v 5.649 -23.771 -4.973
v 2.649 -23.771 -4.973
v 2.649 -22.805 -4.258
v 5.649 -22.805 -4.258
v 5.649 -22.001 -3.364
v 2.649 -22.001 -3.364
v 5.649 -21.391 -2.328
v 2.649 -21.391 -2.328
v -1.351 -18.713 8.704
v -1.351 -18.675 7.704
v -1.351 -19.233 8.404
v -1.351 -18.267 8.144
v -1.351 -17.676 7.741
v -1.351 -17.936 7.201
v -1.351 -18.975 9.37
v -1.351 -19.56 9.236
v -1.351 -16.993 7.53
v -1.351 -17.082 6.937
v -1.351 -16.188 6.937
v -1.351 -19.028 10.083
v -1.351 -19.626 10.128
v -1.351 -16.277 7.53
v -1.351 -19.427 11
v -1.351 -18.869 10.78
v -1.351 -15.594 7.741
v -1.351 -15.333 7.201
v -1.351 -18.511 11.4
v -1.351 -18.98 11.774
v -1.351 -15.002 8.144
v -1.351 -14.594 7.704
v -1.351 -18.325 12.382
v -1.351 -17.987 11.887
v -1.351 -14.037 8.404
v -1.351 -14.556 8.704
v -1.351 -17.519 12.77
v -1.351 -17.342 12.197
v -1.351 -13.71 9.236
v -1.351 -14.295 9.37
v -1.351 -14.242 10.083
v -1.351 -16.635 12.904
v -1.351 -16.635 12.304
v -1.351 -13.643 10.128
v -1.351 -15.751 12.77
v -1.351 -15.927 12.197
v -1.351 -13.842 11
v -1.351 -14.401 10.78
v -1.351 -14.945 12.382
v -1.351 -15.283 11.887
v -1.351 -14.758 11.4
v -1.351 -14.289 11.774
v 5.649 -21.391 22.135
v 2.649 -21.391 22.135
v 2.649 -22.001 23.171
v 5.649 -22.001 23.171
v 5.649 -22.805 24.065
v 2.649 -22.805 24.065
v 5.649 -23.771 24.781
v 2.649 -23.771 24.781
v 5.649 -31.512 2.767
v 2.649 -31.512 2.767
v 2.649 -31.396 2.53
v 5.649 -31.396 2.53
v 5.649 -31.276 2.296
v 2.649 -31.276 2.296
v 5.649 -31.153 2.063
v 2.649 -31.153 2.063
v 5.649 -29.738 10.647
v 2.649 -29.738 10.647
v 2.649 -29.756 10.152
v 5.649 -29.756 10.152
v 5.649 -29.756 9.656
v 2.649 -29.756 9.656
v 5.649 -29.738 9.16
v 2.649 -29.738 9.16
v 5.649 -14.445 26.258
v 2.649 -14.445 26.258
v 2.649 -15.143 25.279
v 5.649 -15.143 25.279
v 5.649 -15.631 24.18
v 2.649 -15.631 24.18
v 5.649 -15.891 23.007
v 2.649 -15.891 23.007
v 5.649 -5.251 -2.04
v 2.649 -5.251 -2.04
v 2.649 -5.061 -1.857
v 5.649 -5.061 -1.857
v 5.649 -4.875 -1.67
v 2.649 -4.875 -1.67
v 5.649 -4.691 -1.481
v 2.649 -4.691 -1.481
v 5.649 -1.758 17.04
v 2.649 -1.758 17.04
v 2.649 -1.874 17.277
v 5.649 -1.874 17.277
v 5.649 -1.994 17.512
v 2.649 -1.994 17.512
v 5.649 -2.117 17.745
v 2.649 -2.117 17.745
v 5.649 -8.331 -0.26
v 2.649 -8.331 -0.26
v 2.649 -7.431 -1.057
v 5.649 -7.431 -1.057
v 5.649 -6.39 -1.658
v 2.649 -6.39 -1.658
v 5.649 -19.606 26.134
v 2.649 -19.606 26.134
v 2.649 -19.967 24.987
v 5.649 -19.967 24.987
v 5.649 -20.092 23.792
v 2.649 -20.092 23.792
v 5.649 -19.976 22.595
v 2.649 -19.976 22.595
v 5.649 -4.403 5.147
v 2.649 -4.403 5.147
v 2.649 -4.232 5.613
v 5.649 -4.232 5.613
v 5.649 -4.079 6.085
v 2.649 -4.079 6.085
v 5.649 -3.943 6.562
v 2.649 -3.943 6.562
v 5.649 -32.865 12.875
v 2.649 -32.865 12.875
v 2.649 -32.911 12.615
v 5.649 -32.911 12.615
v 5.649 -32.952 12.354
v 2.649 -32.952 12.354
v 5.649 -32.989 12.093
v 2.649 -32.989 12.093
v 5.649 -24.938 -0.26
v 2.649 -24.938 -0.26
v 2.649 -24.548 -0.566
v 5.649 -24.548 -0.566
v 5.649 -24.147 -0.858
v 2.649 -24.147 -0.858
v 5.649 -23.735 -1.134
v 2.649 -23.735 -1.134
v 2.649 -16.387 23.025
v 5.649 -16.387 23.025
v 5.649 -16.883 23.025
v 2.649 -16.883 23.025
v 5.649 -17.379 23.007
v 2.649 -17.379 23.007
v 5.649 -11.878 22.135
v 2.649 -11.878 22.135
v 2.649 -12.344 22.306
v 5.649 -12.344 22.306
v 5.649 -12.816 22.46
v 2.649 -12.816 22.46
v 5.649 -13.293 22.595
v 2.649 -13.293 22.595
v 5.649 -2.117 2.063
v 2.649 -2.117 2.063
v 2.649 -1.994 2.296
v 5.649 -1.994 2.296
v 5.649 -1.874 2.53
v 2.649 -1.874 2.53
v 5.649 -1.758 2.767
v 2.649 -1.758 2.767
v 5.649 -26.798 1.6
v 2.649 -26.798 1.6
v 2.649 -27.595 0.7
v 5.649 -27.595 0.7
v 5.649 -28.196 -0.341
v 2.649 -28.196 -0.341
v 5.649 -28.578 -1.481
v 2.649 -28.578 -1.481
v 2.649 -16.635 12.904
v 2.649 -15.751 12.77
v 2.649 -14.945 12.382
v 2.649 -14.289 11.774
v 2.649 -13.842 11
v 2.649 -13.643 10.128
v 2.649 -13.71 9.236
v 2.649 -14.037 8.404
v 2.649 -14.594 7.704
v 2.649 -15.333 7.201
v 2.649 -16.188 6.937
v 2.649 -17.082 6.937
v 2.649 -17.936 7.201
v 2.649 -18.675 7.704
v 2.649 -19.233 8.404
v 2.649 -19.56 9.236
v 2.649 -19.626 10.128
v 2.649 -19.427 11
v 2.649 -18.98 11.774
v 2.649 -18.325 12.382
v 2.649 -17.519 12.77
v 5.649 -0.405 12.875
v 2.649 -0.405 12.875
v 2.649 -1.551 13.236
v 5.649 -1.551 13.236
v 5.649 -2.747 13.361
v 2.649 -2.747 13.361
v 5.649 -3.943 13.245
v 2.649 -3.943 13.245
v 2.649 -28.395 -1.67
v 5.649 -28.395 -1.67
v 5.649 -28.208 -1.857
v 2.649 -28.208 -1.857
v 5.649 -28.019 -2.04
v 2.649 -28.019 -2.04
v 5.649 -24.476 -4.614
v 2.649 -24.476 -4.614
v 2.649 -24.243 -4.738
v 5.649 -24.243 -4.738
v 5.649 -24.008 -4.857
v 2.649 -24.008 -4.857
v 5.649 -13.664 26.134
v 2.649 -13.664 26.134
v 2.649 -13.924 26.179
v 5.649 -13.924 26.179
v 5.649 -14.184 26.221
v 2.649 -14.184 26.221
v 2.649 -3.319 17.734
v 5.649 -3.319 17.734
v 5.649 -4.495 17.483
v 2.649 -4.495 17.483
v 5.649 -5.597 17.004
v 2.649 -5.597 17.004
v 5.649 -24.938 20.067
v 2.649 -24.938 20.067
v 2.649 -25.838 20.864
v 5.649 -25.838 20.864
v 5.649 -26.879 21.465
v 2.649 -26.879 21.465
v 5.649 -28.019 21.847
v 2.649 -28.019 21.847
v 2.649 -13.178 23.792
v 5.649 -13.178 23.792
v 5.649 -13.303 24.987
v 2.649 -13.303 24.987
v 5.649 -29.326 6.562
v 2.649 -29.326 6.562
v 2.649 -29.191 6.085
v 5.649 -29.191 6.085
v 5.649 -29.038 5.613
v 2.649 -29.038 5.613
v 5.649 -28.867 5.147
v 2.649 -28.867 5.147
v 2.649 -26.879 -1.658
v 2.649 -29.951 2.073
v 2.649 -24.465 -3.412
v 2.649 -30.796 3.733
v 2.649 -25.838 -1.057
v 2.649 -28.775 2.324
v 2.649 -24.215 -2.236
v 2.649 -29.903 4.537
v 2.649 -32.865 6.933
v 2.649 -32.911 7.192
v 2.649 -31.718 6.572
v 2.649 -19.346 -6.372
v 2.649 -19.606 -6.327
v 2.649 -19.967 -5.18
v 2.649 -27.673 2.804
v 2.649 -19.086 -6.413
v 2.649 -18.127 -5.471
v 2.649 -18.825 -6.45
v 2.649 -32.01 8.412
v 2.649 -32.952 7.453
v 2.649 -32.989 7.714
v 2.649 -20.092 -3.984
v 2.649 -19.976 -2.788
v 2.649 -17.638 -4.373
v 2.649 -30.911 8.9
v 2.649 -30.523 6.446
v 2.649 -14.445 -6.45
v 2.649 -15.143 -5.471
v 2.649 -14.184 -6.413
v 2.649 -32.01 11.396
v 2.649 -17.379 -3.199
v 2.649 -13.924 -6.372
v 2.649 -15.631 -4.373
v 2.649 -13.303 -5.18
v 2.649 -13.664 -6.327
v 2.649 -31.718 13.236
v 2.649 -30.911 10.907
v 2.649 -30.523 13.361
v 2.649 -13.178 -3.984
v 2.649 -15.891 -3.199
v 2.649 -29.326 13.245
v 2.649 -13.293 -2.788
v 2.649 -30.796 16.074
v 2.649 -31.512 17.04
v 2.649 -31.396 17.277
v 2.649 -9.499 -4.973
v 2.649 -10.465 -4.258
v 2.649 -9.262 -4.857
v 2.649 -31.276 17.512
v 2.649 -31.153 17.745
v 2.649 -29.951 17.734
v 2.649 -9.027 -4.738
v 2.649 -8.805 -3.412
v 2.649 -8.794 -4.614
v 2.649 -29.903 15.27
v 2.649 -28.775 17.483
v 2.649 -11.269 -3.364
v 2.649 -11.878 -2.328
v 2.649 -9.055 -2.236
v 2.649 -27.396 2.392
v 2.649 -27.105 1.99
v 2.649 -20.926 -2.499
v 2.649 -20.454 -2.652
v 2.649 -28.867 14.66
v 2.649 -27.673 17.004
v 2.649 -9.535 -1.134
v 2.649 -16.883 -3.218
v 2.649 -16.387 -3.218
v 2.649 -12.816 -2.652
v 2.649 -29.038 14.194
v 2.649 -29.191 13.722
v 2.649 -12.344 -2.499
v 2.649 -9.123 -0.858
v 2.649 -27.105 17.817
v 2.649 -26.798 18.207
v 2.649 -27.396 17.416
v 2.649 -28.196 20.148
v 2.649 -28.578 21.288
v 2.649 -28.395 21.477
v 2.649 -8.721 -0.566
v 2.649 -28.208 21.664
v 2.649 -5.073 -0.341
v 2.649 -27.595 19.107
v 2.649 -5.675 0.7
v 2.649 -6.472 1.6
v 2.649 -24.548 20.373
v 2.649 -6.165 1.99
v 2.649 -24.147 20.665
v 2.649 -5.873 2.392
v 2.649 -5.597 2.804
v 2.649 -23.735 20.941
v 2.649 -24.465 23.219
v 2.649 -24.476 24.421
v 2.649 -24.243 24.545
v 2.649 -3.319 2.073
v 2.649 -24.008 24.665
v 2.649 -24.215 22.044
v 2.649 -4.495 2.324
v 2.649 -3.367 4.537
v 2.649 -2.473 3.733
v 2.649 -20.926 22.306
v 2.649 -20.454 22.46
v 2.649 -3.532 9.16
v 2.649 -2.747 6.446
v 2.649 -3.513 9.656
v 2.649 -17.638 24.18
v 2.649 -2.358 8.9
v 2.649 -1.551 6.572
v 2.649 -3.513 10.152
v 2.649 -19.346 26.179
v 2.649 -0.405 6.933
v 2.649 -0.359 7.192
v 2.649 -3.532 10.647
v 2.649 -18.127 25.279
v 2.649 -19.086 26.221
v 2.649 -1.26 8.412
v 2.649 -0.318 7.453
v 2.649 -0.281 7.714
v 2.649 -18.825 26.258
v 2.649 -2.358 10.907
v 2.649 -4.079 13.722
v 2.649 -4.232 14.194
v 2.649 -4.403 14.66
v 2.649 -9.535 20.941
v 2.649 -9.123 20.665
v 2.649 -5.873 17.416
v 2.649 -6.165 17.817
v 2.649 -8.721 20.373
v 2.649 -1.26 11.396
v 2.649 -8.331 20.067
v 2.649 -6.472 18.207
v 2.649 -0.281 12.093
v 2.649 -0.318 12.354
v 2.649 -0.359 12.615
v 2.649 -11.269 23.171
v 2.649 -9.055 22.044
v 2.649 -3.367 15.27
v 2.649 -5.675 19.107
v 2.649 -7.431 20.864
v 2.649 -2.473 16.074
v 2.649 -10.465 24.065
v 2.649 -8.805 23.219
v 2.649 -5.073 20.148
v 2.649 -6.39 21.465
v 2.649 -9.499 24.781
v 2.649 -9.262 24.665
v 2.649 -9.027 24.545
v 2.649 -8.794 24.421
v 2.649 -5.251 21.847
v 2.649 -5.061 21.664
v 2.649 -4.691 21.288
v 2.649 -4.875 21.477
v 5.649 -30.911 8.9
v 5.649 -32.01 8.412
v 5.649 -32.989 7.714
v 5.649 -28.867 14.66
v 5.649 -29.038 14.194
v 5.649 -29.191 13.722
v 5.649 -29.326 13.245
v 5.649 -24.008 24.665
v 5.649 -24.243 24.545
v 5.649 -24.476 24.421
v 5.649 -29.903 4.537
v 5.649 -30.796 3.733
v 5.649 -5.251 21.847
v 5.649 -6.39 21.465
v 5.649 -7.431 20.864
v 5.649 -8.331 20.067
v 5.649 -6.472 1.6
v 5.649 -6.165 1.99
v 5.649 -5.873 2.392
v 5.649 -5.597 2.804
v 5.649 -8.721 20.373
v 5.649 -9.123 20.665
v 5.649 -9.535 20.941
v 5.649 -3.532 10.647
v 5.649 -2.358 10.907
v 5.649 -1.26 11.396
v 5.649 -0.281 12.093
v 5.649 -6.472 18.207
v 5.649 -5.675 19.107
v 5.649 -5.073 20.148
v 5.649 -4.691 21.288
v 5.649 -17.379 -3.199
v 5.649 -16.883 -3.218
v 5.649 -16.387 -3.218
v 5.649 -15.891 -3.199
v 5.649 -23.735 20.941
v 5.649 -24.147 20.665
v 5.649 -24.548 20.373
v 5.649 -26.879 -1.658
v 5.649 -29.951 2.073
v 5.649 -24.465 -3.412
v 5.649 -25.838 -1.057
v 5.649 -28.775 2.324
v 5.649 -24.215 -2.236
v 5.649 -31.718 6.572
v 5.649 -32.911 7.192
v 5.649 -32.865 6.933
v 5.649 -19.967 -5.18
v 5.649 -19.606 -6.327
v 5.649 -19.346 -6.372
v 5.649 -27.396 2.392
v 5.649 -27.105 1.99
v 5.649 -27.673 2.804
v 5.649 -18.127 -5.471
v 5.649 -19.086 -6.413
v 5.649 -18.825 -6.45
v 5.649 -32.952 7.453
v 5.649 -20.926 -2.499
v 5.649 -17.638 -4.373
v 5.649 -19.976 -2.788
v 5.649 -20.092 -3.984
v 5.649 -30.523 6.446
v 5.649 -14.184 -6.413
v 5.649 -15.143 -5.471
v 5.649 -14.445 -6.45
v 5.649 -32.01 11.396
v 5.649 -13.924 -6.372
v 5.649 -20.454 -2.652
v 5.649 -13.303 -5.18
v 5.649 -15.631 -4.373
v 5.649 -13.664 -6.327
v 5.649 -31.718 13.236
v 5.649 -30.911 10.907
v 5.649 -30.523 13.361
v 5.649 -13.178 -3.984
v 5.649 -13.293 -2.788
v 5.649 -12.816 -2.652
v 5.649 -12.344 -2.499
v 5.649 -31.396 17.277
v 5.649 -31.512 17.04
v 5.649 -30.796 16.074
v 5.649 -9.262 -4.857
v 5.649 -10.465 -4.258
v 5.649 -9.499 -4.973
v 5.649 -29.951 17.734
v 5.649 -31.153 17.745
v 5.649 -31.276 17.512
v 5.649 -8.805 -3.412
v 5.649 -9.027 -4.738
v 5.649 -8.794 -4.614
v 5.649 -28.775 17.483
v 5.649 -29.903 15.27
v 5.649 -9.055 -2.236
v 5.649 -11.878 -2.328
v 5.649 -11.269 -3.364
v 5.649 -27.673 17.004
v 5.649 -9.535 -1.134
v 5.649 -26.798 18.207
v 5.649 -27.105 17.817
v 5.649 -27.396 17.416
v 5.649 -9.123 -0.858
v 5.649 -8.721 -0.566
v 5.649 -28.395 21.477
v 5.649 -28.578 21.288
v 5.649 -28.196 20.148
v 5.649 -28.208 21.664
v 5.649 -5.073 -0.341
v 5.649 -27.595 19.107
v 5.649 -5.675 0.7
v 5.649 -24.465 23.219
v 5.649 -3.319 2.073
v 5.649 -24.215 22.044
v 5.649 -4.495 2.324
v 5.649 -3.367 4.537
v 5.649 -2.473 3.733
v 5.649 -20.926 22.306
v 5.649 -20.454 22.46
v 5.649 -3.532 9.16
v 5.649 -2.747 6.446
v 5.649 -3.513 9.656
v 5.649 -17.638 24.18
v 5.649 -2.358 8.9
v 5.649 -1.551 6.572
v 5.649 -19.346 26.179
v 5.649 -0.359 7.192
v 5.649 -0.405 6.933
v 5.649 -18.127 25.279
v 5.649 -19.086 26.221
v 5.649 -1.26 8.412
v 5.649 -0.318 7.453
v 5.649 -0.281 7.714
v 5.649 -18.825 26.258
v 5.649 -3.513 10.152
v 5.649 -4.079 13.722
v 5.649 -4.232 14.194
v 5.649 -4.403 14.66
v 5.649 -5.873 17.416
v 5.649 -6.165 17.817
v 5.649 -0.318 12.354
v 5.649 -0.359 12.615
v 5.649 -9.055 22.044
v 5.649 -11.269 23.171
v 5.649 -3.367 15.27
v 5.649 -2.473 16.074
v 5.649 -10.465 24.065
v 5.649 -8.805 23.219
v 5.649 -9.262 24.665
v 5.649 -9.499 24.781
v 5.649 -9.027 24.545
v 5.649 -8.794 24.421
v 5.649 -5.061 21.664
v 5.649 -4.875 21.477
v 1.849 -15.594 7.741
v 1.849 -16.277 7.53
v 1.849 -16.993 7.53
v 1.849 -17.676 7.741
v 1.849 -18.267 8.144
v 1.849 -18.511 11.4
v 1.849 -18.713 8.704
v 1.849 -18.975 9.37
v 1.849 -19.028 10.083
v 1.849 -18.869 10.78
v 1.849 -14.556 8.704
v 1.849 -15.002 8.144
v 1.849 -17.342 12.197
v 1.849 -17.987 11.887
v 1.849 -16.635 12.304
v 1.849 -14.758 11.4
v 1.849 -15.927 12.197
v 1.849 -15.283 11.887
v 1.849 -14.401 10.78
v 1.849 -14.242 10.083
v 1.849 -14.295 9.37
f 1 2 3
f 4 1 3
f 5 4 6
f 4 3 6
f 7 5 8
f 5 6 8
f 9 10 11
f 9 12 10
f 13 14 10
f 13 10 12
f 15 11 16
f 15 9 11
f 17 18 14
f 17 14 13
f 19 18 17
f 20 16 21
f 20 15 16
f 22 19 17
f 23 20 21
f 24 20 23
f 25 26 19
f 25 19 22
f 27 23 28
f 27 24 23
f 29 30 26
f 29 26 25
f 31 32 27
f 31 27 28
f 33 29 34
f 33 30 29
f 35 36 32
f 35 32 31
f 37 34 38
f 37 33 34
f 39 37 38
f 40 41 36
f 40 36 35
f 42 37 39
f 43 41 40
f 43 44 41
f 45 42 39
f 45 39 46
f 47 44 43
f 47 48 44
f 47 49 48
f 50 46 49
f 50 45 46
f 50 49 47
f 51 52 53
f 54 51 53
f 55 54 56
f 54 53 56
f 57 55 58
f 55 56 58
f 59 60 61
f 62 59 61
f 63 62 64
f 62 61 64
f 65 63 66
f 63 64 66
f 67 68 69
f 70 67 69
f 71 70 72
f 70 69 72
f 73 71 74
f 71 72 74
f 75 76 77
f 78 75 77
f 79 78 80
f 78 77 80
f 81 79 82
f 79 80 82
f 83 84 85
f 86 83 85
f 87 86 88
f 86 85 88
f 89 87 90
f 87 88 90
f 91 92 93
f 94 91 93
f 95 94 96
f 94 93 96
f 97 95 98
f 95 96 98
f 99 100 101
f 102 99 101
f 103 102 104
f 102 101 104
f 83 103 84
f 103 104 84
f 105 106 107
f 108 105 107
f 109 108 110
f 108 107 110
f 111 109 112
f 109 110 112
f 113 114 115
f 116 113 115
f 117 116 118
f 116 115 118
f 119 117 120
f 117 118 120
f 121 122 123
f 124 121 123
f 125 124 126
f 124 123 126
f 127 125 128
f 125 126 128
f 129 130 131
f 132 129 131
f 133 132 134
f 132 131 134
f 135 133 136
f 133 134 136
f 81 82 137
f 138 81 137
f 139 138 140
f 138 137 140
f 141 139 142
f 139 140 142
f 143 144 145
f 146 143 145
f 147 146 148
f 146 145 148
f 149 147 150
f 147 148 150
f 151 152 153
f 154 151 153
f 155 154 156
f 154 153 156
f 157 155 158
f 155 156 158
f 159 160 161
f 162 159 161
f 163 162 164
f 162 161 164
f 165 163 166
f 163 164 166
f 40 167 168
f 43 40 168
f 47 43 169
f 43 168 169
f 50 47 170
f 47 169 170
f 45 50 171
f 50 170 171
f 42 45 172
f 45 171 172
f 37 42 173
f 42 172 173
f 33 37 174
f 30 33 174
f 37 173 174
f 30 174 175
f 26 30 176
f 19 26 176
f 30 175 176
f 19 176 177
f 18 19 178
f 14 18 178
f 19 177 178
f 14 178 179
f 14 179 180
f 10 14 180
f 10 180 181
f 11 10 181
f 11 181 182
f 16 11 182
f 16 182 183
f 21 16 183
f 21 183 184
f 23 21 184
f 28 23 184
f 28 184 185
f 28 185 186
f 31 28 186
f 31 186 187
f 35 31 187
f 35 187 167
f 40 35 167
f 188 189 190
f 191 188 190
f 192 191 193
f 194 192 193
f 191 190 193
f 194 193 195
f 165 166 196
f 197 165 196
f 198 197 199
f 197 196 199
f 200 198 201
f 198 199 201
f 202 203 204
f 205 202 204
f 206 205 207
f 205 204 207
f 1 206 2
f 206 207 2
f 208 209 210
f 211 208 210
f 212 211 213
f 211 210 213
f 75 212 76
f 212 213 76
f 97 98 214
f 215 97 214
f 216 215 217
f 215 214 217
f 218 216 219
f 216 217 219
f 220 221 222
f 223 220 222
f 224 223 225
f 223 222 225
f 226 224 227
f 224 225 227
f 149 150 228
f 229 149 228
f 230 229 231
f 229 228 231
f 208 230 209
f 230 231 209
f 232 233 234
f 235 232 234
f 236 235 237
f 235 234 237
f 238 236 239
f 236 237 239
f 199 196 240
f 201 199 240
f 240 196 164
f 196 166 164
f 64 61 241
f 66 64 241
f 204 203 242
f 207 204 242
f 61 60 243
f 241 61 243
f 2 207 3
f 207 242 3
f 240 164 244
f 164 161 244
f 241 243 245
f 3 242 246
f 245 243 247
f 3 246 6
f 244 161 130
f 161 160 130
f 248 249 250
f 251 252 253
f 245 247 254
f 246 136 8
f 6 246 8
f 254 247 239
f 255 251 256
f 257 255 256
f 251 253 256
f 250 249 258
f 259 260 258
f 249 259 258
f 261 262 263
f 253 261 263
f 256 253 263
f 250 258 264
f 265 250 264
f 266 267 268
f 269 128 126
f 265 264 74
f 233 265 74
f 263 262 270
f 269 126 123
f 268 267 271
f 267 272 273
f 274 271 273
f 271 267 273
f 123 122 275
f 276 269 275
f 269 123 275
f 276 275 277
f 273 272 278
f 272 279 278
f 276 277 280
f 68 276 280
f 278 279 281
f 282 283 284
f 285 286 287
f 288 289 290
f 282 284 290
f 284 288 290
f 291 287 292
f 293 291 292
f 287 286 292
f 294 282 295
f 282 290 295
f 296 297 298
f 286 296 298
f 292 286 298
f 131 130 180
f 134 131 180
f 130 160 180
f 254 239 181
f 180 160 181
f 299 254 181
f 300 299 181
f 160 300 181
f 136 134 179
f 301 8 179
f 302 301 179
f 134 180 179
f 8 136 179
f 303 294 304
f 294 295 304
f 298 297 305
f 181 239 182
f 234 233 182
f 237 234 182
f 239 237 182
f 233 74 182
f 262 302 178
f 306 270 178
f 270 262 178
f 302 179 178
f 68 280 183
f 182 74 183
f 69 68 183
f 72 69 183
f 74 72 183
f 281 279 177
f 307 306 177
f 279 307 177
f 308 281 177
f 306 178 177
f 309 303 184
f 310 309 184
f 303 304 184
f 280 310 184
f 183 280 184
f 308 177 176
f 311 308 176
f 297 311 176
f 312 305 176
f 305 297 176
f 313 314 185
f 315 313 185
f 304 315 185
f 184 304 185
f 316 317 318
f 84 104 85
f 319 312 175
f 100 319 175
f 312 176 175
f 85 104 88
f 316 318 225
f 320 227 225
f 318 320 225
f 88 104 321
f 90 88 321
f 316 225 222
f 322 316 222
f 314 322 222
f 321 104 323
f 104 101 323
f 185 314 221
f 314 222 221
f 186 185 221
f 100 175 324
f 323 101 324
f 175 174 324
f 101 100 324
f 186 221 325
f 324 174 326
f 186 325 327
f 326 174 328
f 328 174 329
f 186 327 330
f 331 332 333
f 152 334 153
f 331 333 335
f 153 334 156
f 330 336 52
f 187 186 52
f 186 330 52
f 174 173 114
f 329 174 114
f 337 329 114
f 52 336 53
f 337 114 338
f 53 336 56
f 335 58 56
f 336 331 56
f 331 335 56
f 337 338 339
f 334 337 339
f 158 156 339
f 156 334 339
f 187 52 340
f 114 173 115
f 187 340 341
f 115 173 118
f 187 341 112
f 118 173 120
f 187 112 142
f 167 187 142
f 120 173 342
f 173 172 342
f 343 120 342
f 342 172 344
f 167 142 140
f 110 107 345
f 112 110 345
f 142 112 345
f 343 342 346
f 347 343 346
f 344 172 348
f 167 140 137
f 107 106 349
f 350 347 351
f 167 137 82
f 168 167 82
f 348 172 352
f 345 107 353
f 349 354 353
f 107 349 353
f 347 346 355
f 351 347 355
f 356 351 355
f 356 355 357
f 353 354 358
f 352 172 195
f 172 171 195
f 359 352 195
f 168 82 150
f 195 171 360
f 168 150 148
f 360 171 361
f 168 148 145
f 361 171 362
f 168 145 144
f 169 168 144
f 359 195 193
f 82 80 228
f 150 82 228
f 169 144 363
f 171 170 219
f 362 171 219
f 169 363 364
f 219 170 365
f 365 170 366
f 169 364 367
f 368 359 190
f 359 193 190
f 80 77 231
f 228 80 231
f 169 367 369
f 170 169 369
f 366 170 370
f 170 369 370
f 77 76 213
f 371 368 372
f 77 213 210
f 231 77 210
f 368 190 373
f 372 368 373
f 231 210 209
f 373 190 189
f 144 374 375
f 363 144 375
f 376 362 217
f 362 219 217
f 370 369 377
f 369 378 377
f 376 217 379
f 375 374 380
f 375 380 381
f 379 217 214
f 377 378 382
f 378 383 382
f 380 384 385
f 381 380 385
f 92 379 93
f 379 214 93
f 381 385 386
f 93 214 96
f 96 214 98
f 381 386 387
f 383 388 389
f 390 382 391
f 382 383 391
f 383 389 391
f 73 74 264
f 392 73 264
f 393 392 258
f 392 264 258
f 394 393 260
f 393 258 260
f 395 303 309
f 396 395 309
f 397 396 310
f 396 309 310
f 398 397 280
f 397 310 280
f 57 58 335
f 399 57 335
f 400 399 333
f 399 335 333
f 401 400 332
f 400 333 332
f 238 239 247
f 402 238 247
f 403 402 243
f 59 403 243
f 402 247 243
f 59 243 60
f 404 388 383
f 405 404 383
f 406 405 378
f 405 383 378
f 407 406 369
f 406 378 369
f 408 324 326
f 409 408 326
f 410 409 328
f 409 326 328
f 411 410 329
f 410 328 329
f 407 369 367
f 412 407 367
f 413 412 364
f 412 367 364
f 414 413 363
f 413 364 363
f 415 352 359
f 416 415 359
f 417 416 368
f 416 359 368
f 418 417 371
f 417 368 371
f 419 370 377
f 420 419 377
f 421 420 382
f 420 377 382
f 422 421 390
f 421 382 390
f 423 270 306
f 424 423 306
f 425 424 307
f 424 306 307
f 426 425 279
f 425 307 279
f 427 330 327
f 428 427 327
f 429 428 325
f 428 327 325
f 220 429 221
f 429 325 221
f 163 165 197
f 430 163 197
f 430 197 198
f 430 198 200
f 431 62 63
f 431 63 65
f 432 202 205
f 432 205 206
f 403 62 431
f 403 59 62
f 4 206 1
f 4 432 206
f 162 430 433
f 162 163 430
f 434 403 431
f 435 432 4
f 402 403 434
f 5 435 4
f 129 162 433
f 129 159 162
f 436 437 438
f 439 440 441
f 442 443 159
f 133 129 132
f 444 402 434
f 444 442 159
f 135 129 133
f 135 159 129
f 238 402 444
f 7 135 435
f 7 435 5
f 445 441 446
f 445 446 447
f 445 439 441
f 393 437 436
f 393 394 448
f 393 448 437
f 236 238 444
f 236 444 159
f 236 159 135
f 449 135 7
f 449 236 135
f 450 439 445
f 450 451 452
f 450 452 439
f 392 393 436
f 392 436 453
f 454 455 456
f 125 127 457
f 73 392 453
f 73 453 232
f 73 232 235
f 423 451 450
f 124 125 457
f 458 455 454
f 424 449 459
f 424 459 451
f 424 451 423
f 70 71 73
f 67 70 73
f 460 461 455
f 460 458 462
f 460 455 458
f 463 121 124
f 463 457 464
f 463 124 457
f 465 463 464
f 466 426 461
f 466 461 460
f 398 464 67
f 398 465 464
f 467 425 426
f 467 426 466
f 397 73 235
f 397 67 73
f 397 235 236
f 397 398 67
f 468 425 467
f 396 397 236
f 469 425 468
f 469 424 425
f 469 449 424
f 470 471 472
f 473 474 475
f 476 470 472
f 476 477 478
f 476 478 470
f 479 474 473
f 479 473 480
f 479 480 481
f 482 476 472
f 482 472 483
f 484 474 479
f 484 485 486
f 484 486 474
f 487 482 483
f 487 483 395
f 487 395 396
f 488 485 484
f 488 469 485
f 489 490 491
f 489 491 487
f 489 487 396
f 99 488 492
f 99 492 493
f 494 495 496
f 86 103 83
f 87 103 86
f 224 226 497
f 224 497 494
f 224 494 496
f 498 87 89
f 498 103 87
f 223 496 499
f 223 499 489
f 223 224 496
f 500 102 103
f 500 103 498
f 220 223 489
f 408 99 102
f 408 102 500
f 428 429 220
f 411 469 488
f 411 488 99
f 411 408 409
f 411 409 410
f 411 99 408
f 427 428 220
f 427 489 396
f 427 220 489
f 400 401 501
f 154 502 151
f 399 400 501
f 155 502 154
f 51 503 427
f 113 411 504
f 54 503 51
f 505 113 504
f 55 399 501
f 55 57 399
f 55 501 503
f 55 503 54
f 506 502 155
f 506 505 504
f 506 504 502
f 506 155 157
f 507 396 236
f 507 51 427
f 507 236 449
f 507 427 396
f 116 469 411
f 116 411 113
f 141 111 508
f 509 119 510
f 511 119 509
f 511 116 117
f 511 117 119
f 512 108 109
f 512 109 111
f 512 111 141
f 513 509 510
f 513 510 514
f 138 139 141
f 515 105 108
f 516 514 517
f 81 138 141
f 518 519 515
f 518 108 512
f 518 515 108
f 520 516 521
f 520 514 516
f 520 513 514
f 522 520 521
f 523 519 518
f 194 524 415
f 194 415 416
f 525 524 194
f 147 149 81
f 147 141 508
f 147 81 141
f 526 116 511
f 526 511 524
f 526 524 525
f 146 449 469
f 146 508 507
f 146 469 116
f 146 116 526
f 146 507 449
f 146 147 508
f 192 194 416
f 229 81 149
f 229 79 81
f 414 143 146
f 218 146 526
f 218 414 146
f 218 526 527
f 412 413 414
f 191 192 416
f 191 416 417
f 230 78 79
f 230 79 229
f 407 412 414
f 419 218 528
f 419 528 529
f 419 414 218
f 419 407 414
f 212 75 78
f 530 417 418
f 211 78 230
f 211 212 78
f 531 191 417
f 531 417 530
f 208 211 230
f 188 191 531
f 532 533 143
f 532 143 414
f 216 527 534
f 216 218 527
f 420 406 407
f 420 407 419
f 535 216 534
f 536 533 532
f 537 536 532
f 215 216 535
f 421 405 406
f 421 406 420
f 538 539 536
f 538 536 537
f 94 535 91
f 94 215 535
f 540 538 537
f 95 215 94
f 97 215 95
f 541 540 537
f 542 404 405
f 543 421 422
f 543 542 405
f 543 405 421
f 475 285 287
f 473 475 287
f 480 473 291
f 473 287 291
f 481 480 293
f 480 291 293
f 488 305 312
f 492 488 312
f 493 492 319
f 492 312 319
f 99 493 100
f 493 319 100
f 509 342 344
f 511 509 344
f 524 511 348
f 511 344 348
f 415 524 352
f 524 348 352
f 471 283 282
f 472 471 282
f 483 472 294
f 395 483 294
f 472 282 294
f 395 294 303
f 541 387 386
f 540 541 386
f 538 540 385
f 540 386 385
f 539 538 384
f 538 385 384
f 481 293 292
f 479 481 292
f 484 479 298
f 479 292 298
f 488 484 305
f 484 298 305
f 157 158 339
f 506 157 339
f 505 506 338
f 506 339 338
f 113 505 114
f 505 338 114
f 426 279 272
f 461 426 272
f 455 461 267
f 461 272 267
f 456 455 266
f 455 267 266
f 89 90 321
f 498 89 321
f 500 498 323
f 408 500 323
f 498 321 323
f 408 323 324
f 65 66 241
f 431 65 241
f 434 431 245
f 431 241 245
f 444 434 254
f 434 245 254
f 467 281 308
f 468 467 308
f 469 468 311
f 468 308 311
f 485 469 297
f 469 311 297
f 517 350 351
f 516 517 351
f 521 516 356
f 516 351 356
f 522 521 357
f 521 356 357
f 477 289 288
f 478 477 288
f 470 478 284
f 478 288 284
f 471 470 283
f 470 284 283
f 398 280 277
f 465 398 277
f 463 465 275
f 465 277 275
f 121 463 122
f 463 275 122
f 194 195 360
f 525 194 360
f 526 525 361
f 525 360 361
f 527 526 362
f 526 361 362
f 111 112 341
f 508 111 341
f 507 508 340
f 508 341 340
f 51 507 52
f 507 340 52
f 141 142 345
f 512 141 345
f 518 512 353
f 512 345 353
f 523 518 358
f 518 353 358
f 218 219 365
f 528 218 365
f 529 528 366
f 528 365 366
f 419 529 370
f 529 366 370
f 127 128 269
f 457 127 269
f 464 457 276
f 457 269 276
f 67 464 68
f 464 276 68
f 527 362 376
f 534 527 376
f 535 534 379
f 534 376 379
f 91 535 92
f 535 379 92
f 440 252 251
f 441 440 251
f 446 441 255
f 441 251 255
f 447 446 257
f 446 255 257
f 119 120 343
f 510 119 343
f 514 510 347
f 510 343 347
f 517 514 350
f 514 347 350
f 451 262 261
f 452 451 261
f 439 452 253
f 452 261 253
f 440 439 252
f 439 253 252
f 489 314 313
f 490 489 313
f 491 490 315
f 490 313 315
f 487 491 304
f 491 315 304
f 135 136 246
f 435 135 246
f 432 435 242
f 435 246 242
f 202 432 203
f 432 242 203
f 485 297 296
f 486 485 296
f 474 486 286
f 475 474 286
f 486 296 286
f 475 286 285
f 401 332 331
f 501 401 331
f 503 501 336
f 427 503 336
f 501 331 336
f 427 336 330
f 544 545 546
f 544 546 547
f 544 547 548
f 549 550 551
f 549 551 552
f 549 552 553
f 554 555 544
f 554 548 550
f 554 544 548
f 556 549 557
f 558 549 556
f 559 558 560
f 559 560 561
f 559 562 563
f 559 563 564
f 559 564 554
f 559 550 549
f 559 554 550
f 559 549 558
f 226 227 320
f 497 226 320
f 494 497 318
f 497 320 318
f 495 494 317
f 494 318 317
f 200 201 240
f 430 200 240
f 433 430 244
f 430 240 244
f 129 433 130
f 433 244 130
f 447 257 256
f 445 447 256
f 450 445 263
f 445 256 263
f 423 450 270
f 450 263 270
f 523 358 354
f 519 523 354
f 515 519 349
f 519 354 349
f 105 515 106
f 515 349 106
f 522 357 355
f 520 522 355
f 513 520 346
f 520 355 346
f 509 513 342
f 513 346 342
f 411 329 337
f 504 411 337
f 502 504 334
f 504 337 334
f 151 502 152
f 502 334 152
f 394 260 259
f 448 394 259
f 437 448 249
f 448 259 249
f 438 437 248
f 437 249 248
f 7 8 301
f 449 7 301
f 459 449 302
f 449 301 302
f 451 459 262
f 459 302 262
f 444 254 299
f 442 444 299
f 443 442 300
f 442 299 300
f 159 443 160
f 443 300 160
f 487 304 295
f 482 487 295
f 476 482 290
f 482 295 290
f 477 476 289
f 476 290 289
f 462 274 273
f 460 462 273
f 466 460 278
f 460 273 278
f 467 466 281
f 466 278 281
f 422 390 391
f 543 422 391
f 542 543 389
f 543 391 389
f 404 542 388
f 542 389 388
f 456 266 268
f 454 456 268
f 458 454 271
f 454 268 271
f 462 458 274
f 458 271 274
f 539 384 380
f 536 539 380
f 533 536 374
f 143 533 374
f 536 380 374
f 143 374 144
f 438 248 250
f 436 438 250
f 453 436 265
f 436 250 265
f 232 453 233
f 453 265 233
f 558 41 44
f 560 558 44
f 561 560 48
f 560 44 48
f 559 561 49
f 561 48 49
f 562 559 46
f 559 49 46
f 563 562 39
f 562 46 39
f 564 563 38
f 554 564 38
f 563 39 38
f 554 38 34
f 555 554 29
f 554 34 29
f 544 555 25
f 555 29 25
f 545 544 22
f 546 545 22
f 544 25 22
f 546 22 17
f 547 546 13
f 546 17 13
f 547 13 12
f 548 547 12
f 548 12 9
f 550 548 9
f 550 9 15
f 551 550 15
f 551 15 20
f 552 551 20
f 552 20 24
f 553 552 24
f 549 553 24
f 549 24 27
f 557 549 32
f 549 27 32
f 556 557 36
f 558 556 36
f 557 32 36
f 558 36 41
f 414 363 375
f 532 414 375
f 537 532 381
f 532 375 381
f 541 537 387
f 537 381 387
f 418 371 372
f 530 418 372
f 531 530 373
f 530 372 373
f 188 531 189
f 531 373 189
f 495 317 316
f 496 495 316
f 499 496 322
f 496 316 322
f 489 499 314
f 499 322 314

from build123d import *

# Parameters (mm, degrees)
ISO_START                                 = 2.649023341
ISO_SPUR_GEAR_1_5M_20T_20PA_3FW_2_R       = 0.4
ISO_SPUR_GEAR_1_5M_20T_20PA_3FW_S20_DEPTH = 3
BOSS_EXTRUDE1_DEPTH                       = 4
BOSS_EXTRUDE1_DEPTH_BACK                  = 3
SKETCH1_R                                 = 3
SKETCH2_R                                 = 2.4
CUT_EXTRUDE1_DEPTH                        = 3.2


# Read off the part's stored shape, not the designer's step: ISO - Spur gear 1.5M 20T 20PA 3FW ---S20A75H50L0.8N
with BuildPart() as part:
    # ISO - Spur gear 1.5M 20T 20PA 3FW -- 2 → ISO - Spur gear 1.5M 20T 20PA 3FW ---S20 (new body)
    with BuildSketch(Plane.YZ.offset(ISO_START)):
        with BuildLine():
            ThreePointArc((-13.663753379, 26.133903668), (-14.053655616, 26.200458221), (-14.445041168, 26.257647498))
            ThreePointArc((-14.445041168, 26.257647498), (-15.414573535, 24.741730478), (-15.891009909, 23.006505477))
            ThreePointArc((-15.891009909, 23.006505477), (-16.634824289, 23.027600602), (-17.37863867, 23.006505477))
            ThreePointArc((-17.37863867, 23.006505477), (-17.855075045, 24.741730477), (-18.824607411, 26.257647498))
            ThreePointArc((-18.824607411, 26.257647498), (-19.215992963, 26.200458221), (-19.6058952, 26.133903668))
            ThreePointArc((-19.6058952, 26.133903668), (-20.059531154, 24.39257893), (-19.976435058, 22.59505495))
            ThreePointArc((-19.976435058, 22.59505495), (-20.690363323, 22.385266321), (-21.391254085, 22.135352381))
            ThreePointArc((-21.391254085, 22.135352381), (-22.380586018, 23.638422489), (-23.771110214, 24.780543271))
            ThreePointArc((-23.771110214, 24.780543271), (-24.125667535, 24.605208251), (-24.475920111, 24.421424692))
            ThreePointArc((-24.475920111, 24.421424692), (-24.369254604, 22.625145234), (-23.734760063, 20.941276444))
            ThreePointArc((-23.734760063, 20.941276444), (-24.348917941, 20.521139636), (-24.938277012, 20.066870198))
            ThreePointArc((-24.938277012, 20.066870198), (-26.343661801, 21.190654438), (-28.01906363, 21.847180243))
            ThreePointArc((-28.01906363, 21.847180243), (-28.302086179, 21.570862491), (-28.578403931, 21.287839942))
            ThreePointArc((-28.578403931, 21.287839942), (-27.921878126, 19.612438113), (-26.798093886, 18.207053324))
            ThreePointArc((-26.798093886, 18.207053324), (-27.252363324, 17.617694253), (-27.672500133, 17.003536375))
            ThreePointArc((-27.672500133, 17.003536375), (-29.356368922, 17.638030916), (-31.15264838, 17.744696423))
            ThreePointArc((-31.15264838, 17.744696423), (-31.336431939, 17.394443847), (-31.511766959, 17.039886526))
            ThreePointArc((-31.511766959, 17.039886526), (-30.369646177, 15.64936233), (-28.866576069, 14.660030397))
            ThreePointArc((-28.866576069, 14.660030397), (-29.116490009, 13.959139635), (-29.326278638, 13.24521137))
            ThreePointArc((-29.326278638, 13.24521137), (-31.123802618, 13.328307466), (-32.865127356, 12.874671512))
            ThreePointArc((-32.865127356, 12.874671512), (-32.931681909, 12.484769275), (-32.988871186, 12.093383723))
            ThreePointArc((-32.988871186, 12.093383723), (-31.472954165, 11.123851357), (-29.737729165, 10.647414982))
            ThreePointArc((-29.737729165, 10.647414982), (-29.75882429, 9.903600602), (-29.737729165, 9.159786221))
            ThreePointArc((-29.737729165, 9.159786221), (-31.472954166, 8.683349847), (-32.988871186, 7.71381748))
            ThreePointArc((-32.988871186, 7.71381748), (-32.931681909, 7.322431928), (-32.865127356, 6.932529691))
            ThreePointArc((-32.865127356, 6.932529691), (-31.123802618, 6.478893737), (-29.326278638, 6.561989833))
            ThreePointArc((-29.326278638, 6.561989833), (-29.116490009, 5.848061568), (-28.866576069, 5.147170806))
            ThreePointArc((-28.866576069, 5.147170806), (-30.369646177, 4.157838873), (-31.511766959, 2.767314677))
            ThreePointArc((-31.511766959, 2.767314677), (-31.336431939, 2.412757356), (-31.15264838, 2.06250478))
            ThreePointArc((-31.15264838, 2.06250478), (-29.356368922, 2.169170287), (-27.672500133, 2.803664828))
            ThreePointArc((-27.672500133, 2.803664828), (-27.252363324, 2.18950695), (-26.798093886, 1.600147879))
            ThreePointArc((-26.798093886, 1.600147879), (-27.921878126, 0.19476309), (-28.578403931, -1.480638739))
            ThreePointArc((-28.578403931, -1.480638739), (-28.302086179, -1.763661288), (-28.01906363, -2.03997904))
            ThreePointArc((-28.01906363, -2.03997904), (-26.343661801, -1.383453235), (-24.938277012, -0.259668995))
            ThreePointArc((-24.938277012, -0.259668995), (-24.348917941, -0.713938433), (-23.734760063, -1.134075241))
            ThreePointArc((-23.734760063, -1.134075241), (-24.369254604, -2.817944031), (-24.475920111, -4.614223489))
            ThreePointArc((-24.475920111, -4.614223489), (-24.125667535, -4.798007048), (-23.771110214, -4.973342068))
            ThreePointArc((-23.771110214, -4.973342068), (-22.380586018, -3.831221286), (-21.391254085, -2.328151178))
            ThreePointArc((-21.391254085, -2.328151178), (-20.690363323, -2.578065118), (-19.976435058, -2.787853747))
            ThreePointArc((-19.976435058, -2.787853747), (-20.059531154, -4.585377727), (-19.6058952, -6.326702465))
            ThreePointArc((-19.6058952, -6.326702465), (-19.215992963, -6.393257018), (-18.824607411, -6.450446295))
            ThreePointArc((-18.824607411, -6.450446295), (-17.855075045, -4.934529274), (-17.37863867, -3.199304274))
            ThreePointArc((-17.37863867, -3.199304274), (-16.634824289, -3.220399398), (-15.891009909, -3.199304274))
            ThreePointArc((-15.891009909, -3.199304274), (-15.414573535, -4.934529275), (-14.445041168, -6.450446295))
            ThreePointArc((-14.445041168, -6.450446295), (-14.053655616, -6.393257018), (-13.663753379, -6.326702465))
            ThreePointArc((-13.663753379, -6.326702465), (-13.210117425, -4.585377727), (-13.293213521, -2.787853747))
            ThreePointArc((-13.293213521, -2.787853747), (-12.579285256, -2.578065118), (-11.878394494, -2.328151178))
            ThreePointArc((-11.878394494, -2.328151178), (-10.889062561, -3.831221286), (-9.498538365, -4.973342068))
            ThreePointArc((-9.498538365, -4.973342068), (-9.143981044, -4.798007048), (-8.793728468, -4.614223489))
            ThreePointArc((-8.793728468, -4.614223489), (-8.900393975, -2.817944031), (-9.534888516, -1.134075241))
            ThreePointArc((-9.534888516, -1.134075241), (-8.920730638, -0.713938433), (-8.331371567, -0.259668995))
            ThreePointArc((-8.331371567, -0.259668995), (-6.925986778, -1.383453235), (-5.250584949, -2.03997904))
            ThreePointArc((-5.250584949, -2.03997904), (-4.9675624, -1.763661288), (-4.691244648, -1.480638739))
            ThreePointArc((-4.691244648, -1.480638739), (-5.347770453, 0.19476309), (-6.471554693, 1.600147879))
            ThreePointArc((-6.471554693, 1.600147879), (-6.017285255, 2.18950695), (-5.597148447, 2.803664828))
            ThreePointArc((-5.597148447, 2.803664828), (-3.913279657, 2.169170287), (-2.117000199, 2.06250478))
            ThreePointArc((-2.117000199, 2.06250478), (-1.93321664, 2.412757356), (-1.75788162, 2.767314677))
            ThreePointArc((-1.75788162, 2.767314677), (-2.900002402, 4.157838873), (-4.40307251, 5.147170806))
            ThreePointArc((-4.40307251, 5.147170806), (-4.15315857, 5.848061568), (-3.943369941, 6.561989833))
            ThreePointArc((-3.943369941, 6.561989833), (-2.145845961, 6.478893737), (-0.404521223, 6.932529691))
            ThreePointArc((-0.404521223, 6.932529691), (-0.33796667, 7.322431928), (-0.280777393, 7.71381748))
            ThreePointArc((-0.280777393, 7.71381748), (-1.796694413, 8.683349847), (-3.531919414, 9.159786221))
            ThreePointArc((-3.531919414, 9.159786221), (-3.51082429, 9.903600601), (-3.531919414, 10.647414982))
            ThreePointArc((-3.531919414, 10.647414982), (-1.796694414, 11.123851357), (-0.280777393, 12.093383723))
            ThreePointArc((-0.280777393, 12.093383723), (-0.33796667, 12.484769275), (-0.404521223, 12.874671512))
            ThreePointArc((-0.404521223, 12.874671512), (-2.145845961, 13.328307466), (-3.943369941, 13.24521137))
            ThreePointArc((-3.943369941, 13.24521137), (-4.15315857, 13.959139635), (-4.40307251, 14.660030397))
            ThreePointArc((-4.40307251, 14.660030397), (-2.900002402, 15.64936233), (-1.75788162, 17.039886526))
            ThreePointArc((-1.75788162, 17.039886526), (-1.93321664, 17.394443847), (-2.117000199, 17.744696423))
            ThreePointArc((-2.117000199, 17.744696423), (-3.913279657, 17.638030916), (-5.597148447, 17.003536375))
            ThreePointArc((-5.597148447, 17.003536375), (-6.017285255, 17.617694253), (-6.471554693, 18.207053324))
            ThreePointArc((-6.471554693, 18.207053324), (-5.347770453, 19.612438113), (-4.691244648, 21.287839942))
            ThreePointArc((-4.691244648, 21.287839942), (-4.9675624, 21.570862491), (-5.250584949, 21.847180243))
            ThreePointArc((-5.250584949, 21.847180243), (-6.925986778, 21.190654438), (-8.331371567, 20.066870198))
            ThreePointArc((-8.331371567, 20.066870198), (-8.920730638, 20.521139636), (-9.534888516, 20.941276444))
            ThreePointArc((-9.534888516, 20.941276444), (-8.900393975, 22.625145234), (-8.793728468, 24.421424692))
            ThreePointArc((-8.793728468, 24.421424692), (-9.143981044, 24.605208251), (-9.498538365, 24.780543271))
            ThreePointArc((-9.498538365, 24.780543271), (-10.889062561, 23.638422489), (-11.878394494, 22.135352381))
            ThreePointArc((-11.878394494, 22.135352381), (-12.579285256, 22.385266321), (-13.293213521, 22.59505495))
            ThreePointArc((-13.293213521, 22.59505495), (-13.210117425, 24.39257893), (-13.663753379, 26.133903668))
        make_face()
        with Locations((-16.63482429, 9.903600602)):
            Circle(ISO_SPUR_GEAR_1_5M_20T_20PA_3FW_2_R, mode=Mode.SUBTRACT)
    extrude(amount=ISO_SPUR_GEAR_1_5M_20T_20PA_3FW_S20_DEPTH)

    # Sketch1 → Boss-Extrude1 (add, two sides: drawn at the far end of the back side and taken through both)
    with BuildSketch(Plane.ZY.offset(-2.649023341).offset(-BOSS_EXTRUDE1_DEPTH_BACK)):
        with Locations((9.903600602, -16.63482429)):
            Circle(SKETCH1_R)
    extrude(amount=BOSS_EXTRUDE1_DEPTH + BOSS_EXTRUDE1_DEPTH_BACK)

    # Sketch2 → Cut-Extrude1 (cut)
    with BuildSketch(Plane.ZY.offset(1.350976659)):
        with Locations((9.903600602, -16.63482429)):
            Circle(SKETCH2_R)
    extrude(amount=-CUT_EXTRUDE1_DEPTH, mode=Mode.SUBTRACT)


solid = part.part
